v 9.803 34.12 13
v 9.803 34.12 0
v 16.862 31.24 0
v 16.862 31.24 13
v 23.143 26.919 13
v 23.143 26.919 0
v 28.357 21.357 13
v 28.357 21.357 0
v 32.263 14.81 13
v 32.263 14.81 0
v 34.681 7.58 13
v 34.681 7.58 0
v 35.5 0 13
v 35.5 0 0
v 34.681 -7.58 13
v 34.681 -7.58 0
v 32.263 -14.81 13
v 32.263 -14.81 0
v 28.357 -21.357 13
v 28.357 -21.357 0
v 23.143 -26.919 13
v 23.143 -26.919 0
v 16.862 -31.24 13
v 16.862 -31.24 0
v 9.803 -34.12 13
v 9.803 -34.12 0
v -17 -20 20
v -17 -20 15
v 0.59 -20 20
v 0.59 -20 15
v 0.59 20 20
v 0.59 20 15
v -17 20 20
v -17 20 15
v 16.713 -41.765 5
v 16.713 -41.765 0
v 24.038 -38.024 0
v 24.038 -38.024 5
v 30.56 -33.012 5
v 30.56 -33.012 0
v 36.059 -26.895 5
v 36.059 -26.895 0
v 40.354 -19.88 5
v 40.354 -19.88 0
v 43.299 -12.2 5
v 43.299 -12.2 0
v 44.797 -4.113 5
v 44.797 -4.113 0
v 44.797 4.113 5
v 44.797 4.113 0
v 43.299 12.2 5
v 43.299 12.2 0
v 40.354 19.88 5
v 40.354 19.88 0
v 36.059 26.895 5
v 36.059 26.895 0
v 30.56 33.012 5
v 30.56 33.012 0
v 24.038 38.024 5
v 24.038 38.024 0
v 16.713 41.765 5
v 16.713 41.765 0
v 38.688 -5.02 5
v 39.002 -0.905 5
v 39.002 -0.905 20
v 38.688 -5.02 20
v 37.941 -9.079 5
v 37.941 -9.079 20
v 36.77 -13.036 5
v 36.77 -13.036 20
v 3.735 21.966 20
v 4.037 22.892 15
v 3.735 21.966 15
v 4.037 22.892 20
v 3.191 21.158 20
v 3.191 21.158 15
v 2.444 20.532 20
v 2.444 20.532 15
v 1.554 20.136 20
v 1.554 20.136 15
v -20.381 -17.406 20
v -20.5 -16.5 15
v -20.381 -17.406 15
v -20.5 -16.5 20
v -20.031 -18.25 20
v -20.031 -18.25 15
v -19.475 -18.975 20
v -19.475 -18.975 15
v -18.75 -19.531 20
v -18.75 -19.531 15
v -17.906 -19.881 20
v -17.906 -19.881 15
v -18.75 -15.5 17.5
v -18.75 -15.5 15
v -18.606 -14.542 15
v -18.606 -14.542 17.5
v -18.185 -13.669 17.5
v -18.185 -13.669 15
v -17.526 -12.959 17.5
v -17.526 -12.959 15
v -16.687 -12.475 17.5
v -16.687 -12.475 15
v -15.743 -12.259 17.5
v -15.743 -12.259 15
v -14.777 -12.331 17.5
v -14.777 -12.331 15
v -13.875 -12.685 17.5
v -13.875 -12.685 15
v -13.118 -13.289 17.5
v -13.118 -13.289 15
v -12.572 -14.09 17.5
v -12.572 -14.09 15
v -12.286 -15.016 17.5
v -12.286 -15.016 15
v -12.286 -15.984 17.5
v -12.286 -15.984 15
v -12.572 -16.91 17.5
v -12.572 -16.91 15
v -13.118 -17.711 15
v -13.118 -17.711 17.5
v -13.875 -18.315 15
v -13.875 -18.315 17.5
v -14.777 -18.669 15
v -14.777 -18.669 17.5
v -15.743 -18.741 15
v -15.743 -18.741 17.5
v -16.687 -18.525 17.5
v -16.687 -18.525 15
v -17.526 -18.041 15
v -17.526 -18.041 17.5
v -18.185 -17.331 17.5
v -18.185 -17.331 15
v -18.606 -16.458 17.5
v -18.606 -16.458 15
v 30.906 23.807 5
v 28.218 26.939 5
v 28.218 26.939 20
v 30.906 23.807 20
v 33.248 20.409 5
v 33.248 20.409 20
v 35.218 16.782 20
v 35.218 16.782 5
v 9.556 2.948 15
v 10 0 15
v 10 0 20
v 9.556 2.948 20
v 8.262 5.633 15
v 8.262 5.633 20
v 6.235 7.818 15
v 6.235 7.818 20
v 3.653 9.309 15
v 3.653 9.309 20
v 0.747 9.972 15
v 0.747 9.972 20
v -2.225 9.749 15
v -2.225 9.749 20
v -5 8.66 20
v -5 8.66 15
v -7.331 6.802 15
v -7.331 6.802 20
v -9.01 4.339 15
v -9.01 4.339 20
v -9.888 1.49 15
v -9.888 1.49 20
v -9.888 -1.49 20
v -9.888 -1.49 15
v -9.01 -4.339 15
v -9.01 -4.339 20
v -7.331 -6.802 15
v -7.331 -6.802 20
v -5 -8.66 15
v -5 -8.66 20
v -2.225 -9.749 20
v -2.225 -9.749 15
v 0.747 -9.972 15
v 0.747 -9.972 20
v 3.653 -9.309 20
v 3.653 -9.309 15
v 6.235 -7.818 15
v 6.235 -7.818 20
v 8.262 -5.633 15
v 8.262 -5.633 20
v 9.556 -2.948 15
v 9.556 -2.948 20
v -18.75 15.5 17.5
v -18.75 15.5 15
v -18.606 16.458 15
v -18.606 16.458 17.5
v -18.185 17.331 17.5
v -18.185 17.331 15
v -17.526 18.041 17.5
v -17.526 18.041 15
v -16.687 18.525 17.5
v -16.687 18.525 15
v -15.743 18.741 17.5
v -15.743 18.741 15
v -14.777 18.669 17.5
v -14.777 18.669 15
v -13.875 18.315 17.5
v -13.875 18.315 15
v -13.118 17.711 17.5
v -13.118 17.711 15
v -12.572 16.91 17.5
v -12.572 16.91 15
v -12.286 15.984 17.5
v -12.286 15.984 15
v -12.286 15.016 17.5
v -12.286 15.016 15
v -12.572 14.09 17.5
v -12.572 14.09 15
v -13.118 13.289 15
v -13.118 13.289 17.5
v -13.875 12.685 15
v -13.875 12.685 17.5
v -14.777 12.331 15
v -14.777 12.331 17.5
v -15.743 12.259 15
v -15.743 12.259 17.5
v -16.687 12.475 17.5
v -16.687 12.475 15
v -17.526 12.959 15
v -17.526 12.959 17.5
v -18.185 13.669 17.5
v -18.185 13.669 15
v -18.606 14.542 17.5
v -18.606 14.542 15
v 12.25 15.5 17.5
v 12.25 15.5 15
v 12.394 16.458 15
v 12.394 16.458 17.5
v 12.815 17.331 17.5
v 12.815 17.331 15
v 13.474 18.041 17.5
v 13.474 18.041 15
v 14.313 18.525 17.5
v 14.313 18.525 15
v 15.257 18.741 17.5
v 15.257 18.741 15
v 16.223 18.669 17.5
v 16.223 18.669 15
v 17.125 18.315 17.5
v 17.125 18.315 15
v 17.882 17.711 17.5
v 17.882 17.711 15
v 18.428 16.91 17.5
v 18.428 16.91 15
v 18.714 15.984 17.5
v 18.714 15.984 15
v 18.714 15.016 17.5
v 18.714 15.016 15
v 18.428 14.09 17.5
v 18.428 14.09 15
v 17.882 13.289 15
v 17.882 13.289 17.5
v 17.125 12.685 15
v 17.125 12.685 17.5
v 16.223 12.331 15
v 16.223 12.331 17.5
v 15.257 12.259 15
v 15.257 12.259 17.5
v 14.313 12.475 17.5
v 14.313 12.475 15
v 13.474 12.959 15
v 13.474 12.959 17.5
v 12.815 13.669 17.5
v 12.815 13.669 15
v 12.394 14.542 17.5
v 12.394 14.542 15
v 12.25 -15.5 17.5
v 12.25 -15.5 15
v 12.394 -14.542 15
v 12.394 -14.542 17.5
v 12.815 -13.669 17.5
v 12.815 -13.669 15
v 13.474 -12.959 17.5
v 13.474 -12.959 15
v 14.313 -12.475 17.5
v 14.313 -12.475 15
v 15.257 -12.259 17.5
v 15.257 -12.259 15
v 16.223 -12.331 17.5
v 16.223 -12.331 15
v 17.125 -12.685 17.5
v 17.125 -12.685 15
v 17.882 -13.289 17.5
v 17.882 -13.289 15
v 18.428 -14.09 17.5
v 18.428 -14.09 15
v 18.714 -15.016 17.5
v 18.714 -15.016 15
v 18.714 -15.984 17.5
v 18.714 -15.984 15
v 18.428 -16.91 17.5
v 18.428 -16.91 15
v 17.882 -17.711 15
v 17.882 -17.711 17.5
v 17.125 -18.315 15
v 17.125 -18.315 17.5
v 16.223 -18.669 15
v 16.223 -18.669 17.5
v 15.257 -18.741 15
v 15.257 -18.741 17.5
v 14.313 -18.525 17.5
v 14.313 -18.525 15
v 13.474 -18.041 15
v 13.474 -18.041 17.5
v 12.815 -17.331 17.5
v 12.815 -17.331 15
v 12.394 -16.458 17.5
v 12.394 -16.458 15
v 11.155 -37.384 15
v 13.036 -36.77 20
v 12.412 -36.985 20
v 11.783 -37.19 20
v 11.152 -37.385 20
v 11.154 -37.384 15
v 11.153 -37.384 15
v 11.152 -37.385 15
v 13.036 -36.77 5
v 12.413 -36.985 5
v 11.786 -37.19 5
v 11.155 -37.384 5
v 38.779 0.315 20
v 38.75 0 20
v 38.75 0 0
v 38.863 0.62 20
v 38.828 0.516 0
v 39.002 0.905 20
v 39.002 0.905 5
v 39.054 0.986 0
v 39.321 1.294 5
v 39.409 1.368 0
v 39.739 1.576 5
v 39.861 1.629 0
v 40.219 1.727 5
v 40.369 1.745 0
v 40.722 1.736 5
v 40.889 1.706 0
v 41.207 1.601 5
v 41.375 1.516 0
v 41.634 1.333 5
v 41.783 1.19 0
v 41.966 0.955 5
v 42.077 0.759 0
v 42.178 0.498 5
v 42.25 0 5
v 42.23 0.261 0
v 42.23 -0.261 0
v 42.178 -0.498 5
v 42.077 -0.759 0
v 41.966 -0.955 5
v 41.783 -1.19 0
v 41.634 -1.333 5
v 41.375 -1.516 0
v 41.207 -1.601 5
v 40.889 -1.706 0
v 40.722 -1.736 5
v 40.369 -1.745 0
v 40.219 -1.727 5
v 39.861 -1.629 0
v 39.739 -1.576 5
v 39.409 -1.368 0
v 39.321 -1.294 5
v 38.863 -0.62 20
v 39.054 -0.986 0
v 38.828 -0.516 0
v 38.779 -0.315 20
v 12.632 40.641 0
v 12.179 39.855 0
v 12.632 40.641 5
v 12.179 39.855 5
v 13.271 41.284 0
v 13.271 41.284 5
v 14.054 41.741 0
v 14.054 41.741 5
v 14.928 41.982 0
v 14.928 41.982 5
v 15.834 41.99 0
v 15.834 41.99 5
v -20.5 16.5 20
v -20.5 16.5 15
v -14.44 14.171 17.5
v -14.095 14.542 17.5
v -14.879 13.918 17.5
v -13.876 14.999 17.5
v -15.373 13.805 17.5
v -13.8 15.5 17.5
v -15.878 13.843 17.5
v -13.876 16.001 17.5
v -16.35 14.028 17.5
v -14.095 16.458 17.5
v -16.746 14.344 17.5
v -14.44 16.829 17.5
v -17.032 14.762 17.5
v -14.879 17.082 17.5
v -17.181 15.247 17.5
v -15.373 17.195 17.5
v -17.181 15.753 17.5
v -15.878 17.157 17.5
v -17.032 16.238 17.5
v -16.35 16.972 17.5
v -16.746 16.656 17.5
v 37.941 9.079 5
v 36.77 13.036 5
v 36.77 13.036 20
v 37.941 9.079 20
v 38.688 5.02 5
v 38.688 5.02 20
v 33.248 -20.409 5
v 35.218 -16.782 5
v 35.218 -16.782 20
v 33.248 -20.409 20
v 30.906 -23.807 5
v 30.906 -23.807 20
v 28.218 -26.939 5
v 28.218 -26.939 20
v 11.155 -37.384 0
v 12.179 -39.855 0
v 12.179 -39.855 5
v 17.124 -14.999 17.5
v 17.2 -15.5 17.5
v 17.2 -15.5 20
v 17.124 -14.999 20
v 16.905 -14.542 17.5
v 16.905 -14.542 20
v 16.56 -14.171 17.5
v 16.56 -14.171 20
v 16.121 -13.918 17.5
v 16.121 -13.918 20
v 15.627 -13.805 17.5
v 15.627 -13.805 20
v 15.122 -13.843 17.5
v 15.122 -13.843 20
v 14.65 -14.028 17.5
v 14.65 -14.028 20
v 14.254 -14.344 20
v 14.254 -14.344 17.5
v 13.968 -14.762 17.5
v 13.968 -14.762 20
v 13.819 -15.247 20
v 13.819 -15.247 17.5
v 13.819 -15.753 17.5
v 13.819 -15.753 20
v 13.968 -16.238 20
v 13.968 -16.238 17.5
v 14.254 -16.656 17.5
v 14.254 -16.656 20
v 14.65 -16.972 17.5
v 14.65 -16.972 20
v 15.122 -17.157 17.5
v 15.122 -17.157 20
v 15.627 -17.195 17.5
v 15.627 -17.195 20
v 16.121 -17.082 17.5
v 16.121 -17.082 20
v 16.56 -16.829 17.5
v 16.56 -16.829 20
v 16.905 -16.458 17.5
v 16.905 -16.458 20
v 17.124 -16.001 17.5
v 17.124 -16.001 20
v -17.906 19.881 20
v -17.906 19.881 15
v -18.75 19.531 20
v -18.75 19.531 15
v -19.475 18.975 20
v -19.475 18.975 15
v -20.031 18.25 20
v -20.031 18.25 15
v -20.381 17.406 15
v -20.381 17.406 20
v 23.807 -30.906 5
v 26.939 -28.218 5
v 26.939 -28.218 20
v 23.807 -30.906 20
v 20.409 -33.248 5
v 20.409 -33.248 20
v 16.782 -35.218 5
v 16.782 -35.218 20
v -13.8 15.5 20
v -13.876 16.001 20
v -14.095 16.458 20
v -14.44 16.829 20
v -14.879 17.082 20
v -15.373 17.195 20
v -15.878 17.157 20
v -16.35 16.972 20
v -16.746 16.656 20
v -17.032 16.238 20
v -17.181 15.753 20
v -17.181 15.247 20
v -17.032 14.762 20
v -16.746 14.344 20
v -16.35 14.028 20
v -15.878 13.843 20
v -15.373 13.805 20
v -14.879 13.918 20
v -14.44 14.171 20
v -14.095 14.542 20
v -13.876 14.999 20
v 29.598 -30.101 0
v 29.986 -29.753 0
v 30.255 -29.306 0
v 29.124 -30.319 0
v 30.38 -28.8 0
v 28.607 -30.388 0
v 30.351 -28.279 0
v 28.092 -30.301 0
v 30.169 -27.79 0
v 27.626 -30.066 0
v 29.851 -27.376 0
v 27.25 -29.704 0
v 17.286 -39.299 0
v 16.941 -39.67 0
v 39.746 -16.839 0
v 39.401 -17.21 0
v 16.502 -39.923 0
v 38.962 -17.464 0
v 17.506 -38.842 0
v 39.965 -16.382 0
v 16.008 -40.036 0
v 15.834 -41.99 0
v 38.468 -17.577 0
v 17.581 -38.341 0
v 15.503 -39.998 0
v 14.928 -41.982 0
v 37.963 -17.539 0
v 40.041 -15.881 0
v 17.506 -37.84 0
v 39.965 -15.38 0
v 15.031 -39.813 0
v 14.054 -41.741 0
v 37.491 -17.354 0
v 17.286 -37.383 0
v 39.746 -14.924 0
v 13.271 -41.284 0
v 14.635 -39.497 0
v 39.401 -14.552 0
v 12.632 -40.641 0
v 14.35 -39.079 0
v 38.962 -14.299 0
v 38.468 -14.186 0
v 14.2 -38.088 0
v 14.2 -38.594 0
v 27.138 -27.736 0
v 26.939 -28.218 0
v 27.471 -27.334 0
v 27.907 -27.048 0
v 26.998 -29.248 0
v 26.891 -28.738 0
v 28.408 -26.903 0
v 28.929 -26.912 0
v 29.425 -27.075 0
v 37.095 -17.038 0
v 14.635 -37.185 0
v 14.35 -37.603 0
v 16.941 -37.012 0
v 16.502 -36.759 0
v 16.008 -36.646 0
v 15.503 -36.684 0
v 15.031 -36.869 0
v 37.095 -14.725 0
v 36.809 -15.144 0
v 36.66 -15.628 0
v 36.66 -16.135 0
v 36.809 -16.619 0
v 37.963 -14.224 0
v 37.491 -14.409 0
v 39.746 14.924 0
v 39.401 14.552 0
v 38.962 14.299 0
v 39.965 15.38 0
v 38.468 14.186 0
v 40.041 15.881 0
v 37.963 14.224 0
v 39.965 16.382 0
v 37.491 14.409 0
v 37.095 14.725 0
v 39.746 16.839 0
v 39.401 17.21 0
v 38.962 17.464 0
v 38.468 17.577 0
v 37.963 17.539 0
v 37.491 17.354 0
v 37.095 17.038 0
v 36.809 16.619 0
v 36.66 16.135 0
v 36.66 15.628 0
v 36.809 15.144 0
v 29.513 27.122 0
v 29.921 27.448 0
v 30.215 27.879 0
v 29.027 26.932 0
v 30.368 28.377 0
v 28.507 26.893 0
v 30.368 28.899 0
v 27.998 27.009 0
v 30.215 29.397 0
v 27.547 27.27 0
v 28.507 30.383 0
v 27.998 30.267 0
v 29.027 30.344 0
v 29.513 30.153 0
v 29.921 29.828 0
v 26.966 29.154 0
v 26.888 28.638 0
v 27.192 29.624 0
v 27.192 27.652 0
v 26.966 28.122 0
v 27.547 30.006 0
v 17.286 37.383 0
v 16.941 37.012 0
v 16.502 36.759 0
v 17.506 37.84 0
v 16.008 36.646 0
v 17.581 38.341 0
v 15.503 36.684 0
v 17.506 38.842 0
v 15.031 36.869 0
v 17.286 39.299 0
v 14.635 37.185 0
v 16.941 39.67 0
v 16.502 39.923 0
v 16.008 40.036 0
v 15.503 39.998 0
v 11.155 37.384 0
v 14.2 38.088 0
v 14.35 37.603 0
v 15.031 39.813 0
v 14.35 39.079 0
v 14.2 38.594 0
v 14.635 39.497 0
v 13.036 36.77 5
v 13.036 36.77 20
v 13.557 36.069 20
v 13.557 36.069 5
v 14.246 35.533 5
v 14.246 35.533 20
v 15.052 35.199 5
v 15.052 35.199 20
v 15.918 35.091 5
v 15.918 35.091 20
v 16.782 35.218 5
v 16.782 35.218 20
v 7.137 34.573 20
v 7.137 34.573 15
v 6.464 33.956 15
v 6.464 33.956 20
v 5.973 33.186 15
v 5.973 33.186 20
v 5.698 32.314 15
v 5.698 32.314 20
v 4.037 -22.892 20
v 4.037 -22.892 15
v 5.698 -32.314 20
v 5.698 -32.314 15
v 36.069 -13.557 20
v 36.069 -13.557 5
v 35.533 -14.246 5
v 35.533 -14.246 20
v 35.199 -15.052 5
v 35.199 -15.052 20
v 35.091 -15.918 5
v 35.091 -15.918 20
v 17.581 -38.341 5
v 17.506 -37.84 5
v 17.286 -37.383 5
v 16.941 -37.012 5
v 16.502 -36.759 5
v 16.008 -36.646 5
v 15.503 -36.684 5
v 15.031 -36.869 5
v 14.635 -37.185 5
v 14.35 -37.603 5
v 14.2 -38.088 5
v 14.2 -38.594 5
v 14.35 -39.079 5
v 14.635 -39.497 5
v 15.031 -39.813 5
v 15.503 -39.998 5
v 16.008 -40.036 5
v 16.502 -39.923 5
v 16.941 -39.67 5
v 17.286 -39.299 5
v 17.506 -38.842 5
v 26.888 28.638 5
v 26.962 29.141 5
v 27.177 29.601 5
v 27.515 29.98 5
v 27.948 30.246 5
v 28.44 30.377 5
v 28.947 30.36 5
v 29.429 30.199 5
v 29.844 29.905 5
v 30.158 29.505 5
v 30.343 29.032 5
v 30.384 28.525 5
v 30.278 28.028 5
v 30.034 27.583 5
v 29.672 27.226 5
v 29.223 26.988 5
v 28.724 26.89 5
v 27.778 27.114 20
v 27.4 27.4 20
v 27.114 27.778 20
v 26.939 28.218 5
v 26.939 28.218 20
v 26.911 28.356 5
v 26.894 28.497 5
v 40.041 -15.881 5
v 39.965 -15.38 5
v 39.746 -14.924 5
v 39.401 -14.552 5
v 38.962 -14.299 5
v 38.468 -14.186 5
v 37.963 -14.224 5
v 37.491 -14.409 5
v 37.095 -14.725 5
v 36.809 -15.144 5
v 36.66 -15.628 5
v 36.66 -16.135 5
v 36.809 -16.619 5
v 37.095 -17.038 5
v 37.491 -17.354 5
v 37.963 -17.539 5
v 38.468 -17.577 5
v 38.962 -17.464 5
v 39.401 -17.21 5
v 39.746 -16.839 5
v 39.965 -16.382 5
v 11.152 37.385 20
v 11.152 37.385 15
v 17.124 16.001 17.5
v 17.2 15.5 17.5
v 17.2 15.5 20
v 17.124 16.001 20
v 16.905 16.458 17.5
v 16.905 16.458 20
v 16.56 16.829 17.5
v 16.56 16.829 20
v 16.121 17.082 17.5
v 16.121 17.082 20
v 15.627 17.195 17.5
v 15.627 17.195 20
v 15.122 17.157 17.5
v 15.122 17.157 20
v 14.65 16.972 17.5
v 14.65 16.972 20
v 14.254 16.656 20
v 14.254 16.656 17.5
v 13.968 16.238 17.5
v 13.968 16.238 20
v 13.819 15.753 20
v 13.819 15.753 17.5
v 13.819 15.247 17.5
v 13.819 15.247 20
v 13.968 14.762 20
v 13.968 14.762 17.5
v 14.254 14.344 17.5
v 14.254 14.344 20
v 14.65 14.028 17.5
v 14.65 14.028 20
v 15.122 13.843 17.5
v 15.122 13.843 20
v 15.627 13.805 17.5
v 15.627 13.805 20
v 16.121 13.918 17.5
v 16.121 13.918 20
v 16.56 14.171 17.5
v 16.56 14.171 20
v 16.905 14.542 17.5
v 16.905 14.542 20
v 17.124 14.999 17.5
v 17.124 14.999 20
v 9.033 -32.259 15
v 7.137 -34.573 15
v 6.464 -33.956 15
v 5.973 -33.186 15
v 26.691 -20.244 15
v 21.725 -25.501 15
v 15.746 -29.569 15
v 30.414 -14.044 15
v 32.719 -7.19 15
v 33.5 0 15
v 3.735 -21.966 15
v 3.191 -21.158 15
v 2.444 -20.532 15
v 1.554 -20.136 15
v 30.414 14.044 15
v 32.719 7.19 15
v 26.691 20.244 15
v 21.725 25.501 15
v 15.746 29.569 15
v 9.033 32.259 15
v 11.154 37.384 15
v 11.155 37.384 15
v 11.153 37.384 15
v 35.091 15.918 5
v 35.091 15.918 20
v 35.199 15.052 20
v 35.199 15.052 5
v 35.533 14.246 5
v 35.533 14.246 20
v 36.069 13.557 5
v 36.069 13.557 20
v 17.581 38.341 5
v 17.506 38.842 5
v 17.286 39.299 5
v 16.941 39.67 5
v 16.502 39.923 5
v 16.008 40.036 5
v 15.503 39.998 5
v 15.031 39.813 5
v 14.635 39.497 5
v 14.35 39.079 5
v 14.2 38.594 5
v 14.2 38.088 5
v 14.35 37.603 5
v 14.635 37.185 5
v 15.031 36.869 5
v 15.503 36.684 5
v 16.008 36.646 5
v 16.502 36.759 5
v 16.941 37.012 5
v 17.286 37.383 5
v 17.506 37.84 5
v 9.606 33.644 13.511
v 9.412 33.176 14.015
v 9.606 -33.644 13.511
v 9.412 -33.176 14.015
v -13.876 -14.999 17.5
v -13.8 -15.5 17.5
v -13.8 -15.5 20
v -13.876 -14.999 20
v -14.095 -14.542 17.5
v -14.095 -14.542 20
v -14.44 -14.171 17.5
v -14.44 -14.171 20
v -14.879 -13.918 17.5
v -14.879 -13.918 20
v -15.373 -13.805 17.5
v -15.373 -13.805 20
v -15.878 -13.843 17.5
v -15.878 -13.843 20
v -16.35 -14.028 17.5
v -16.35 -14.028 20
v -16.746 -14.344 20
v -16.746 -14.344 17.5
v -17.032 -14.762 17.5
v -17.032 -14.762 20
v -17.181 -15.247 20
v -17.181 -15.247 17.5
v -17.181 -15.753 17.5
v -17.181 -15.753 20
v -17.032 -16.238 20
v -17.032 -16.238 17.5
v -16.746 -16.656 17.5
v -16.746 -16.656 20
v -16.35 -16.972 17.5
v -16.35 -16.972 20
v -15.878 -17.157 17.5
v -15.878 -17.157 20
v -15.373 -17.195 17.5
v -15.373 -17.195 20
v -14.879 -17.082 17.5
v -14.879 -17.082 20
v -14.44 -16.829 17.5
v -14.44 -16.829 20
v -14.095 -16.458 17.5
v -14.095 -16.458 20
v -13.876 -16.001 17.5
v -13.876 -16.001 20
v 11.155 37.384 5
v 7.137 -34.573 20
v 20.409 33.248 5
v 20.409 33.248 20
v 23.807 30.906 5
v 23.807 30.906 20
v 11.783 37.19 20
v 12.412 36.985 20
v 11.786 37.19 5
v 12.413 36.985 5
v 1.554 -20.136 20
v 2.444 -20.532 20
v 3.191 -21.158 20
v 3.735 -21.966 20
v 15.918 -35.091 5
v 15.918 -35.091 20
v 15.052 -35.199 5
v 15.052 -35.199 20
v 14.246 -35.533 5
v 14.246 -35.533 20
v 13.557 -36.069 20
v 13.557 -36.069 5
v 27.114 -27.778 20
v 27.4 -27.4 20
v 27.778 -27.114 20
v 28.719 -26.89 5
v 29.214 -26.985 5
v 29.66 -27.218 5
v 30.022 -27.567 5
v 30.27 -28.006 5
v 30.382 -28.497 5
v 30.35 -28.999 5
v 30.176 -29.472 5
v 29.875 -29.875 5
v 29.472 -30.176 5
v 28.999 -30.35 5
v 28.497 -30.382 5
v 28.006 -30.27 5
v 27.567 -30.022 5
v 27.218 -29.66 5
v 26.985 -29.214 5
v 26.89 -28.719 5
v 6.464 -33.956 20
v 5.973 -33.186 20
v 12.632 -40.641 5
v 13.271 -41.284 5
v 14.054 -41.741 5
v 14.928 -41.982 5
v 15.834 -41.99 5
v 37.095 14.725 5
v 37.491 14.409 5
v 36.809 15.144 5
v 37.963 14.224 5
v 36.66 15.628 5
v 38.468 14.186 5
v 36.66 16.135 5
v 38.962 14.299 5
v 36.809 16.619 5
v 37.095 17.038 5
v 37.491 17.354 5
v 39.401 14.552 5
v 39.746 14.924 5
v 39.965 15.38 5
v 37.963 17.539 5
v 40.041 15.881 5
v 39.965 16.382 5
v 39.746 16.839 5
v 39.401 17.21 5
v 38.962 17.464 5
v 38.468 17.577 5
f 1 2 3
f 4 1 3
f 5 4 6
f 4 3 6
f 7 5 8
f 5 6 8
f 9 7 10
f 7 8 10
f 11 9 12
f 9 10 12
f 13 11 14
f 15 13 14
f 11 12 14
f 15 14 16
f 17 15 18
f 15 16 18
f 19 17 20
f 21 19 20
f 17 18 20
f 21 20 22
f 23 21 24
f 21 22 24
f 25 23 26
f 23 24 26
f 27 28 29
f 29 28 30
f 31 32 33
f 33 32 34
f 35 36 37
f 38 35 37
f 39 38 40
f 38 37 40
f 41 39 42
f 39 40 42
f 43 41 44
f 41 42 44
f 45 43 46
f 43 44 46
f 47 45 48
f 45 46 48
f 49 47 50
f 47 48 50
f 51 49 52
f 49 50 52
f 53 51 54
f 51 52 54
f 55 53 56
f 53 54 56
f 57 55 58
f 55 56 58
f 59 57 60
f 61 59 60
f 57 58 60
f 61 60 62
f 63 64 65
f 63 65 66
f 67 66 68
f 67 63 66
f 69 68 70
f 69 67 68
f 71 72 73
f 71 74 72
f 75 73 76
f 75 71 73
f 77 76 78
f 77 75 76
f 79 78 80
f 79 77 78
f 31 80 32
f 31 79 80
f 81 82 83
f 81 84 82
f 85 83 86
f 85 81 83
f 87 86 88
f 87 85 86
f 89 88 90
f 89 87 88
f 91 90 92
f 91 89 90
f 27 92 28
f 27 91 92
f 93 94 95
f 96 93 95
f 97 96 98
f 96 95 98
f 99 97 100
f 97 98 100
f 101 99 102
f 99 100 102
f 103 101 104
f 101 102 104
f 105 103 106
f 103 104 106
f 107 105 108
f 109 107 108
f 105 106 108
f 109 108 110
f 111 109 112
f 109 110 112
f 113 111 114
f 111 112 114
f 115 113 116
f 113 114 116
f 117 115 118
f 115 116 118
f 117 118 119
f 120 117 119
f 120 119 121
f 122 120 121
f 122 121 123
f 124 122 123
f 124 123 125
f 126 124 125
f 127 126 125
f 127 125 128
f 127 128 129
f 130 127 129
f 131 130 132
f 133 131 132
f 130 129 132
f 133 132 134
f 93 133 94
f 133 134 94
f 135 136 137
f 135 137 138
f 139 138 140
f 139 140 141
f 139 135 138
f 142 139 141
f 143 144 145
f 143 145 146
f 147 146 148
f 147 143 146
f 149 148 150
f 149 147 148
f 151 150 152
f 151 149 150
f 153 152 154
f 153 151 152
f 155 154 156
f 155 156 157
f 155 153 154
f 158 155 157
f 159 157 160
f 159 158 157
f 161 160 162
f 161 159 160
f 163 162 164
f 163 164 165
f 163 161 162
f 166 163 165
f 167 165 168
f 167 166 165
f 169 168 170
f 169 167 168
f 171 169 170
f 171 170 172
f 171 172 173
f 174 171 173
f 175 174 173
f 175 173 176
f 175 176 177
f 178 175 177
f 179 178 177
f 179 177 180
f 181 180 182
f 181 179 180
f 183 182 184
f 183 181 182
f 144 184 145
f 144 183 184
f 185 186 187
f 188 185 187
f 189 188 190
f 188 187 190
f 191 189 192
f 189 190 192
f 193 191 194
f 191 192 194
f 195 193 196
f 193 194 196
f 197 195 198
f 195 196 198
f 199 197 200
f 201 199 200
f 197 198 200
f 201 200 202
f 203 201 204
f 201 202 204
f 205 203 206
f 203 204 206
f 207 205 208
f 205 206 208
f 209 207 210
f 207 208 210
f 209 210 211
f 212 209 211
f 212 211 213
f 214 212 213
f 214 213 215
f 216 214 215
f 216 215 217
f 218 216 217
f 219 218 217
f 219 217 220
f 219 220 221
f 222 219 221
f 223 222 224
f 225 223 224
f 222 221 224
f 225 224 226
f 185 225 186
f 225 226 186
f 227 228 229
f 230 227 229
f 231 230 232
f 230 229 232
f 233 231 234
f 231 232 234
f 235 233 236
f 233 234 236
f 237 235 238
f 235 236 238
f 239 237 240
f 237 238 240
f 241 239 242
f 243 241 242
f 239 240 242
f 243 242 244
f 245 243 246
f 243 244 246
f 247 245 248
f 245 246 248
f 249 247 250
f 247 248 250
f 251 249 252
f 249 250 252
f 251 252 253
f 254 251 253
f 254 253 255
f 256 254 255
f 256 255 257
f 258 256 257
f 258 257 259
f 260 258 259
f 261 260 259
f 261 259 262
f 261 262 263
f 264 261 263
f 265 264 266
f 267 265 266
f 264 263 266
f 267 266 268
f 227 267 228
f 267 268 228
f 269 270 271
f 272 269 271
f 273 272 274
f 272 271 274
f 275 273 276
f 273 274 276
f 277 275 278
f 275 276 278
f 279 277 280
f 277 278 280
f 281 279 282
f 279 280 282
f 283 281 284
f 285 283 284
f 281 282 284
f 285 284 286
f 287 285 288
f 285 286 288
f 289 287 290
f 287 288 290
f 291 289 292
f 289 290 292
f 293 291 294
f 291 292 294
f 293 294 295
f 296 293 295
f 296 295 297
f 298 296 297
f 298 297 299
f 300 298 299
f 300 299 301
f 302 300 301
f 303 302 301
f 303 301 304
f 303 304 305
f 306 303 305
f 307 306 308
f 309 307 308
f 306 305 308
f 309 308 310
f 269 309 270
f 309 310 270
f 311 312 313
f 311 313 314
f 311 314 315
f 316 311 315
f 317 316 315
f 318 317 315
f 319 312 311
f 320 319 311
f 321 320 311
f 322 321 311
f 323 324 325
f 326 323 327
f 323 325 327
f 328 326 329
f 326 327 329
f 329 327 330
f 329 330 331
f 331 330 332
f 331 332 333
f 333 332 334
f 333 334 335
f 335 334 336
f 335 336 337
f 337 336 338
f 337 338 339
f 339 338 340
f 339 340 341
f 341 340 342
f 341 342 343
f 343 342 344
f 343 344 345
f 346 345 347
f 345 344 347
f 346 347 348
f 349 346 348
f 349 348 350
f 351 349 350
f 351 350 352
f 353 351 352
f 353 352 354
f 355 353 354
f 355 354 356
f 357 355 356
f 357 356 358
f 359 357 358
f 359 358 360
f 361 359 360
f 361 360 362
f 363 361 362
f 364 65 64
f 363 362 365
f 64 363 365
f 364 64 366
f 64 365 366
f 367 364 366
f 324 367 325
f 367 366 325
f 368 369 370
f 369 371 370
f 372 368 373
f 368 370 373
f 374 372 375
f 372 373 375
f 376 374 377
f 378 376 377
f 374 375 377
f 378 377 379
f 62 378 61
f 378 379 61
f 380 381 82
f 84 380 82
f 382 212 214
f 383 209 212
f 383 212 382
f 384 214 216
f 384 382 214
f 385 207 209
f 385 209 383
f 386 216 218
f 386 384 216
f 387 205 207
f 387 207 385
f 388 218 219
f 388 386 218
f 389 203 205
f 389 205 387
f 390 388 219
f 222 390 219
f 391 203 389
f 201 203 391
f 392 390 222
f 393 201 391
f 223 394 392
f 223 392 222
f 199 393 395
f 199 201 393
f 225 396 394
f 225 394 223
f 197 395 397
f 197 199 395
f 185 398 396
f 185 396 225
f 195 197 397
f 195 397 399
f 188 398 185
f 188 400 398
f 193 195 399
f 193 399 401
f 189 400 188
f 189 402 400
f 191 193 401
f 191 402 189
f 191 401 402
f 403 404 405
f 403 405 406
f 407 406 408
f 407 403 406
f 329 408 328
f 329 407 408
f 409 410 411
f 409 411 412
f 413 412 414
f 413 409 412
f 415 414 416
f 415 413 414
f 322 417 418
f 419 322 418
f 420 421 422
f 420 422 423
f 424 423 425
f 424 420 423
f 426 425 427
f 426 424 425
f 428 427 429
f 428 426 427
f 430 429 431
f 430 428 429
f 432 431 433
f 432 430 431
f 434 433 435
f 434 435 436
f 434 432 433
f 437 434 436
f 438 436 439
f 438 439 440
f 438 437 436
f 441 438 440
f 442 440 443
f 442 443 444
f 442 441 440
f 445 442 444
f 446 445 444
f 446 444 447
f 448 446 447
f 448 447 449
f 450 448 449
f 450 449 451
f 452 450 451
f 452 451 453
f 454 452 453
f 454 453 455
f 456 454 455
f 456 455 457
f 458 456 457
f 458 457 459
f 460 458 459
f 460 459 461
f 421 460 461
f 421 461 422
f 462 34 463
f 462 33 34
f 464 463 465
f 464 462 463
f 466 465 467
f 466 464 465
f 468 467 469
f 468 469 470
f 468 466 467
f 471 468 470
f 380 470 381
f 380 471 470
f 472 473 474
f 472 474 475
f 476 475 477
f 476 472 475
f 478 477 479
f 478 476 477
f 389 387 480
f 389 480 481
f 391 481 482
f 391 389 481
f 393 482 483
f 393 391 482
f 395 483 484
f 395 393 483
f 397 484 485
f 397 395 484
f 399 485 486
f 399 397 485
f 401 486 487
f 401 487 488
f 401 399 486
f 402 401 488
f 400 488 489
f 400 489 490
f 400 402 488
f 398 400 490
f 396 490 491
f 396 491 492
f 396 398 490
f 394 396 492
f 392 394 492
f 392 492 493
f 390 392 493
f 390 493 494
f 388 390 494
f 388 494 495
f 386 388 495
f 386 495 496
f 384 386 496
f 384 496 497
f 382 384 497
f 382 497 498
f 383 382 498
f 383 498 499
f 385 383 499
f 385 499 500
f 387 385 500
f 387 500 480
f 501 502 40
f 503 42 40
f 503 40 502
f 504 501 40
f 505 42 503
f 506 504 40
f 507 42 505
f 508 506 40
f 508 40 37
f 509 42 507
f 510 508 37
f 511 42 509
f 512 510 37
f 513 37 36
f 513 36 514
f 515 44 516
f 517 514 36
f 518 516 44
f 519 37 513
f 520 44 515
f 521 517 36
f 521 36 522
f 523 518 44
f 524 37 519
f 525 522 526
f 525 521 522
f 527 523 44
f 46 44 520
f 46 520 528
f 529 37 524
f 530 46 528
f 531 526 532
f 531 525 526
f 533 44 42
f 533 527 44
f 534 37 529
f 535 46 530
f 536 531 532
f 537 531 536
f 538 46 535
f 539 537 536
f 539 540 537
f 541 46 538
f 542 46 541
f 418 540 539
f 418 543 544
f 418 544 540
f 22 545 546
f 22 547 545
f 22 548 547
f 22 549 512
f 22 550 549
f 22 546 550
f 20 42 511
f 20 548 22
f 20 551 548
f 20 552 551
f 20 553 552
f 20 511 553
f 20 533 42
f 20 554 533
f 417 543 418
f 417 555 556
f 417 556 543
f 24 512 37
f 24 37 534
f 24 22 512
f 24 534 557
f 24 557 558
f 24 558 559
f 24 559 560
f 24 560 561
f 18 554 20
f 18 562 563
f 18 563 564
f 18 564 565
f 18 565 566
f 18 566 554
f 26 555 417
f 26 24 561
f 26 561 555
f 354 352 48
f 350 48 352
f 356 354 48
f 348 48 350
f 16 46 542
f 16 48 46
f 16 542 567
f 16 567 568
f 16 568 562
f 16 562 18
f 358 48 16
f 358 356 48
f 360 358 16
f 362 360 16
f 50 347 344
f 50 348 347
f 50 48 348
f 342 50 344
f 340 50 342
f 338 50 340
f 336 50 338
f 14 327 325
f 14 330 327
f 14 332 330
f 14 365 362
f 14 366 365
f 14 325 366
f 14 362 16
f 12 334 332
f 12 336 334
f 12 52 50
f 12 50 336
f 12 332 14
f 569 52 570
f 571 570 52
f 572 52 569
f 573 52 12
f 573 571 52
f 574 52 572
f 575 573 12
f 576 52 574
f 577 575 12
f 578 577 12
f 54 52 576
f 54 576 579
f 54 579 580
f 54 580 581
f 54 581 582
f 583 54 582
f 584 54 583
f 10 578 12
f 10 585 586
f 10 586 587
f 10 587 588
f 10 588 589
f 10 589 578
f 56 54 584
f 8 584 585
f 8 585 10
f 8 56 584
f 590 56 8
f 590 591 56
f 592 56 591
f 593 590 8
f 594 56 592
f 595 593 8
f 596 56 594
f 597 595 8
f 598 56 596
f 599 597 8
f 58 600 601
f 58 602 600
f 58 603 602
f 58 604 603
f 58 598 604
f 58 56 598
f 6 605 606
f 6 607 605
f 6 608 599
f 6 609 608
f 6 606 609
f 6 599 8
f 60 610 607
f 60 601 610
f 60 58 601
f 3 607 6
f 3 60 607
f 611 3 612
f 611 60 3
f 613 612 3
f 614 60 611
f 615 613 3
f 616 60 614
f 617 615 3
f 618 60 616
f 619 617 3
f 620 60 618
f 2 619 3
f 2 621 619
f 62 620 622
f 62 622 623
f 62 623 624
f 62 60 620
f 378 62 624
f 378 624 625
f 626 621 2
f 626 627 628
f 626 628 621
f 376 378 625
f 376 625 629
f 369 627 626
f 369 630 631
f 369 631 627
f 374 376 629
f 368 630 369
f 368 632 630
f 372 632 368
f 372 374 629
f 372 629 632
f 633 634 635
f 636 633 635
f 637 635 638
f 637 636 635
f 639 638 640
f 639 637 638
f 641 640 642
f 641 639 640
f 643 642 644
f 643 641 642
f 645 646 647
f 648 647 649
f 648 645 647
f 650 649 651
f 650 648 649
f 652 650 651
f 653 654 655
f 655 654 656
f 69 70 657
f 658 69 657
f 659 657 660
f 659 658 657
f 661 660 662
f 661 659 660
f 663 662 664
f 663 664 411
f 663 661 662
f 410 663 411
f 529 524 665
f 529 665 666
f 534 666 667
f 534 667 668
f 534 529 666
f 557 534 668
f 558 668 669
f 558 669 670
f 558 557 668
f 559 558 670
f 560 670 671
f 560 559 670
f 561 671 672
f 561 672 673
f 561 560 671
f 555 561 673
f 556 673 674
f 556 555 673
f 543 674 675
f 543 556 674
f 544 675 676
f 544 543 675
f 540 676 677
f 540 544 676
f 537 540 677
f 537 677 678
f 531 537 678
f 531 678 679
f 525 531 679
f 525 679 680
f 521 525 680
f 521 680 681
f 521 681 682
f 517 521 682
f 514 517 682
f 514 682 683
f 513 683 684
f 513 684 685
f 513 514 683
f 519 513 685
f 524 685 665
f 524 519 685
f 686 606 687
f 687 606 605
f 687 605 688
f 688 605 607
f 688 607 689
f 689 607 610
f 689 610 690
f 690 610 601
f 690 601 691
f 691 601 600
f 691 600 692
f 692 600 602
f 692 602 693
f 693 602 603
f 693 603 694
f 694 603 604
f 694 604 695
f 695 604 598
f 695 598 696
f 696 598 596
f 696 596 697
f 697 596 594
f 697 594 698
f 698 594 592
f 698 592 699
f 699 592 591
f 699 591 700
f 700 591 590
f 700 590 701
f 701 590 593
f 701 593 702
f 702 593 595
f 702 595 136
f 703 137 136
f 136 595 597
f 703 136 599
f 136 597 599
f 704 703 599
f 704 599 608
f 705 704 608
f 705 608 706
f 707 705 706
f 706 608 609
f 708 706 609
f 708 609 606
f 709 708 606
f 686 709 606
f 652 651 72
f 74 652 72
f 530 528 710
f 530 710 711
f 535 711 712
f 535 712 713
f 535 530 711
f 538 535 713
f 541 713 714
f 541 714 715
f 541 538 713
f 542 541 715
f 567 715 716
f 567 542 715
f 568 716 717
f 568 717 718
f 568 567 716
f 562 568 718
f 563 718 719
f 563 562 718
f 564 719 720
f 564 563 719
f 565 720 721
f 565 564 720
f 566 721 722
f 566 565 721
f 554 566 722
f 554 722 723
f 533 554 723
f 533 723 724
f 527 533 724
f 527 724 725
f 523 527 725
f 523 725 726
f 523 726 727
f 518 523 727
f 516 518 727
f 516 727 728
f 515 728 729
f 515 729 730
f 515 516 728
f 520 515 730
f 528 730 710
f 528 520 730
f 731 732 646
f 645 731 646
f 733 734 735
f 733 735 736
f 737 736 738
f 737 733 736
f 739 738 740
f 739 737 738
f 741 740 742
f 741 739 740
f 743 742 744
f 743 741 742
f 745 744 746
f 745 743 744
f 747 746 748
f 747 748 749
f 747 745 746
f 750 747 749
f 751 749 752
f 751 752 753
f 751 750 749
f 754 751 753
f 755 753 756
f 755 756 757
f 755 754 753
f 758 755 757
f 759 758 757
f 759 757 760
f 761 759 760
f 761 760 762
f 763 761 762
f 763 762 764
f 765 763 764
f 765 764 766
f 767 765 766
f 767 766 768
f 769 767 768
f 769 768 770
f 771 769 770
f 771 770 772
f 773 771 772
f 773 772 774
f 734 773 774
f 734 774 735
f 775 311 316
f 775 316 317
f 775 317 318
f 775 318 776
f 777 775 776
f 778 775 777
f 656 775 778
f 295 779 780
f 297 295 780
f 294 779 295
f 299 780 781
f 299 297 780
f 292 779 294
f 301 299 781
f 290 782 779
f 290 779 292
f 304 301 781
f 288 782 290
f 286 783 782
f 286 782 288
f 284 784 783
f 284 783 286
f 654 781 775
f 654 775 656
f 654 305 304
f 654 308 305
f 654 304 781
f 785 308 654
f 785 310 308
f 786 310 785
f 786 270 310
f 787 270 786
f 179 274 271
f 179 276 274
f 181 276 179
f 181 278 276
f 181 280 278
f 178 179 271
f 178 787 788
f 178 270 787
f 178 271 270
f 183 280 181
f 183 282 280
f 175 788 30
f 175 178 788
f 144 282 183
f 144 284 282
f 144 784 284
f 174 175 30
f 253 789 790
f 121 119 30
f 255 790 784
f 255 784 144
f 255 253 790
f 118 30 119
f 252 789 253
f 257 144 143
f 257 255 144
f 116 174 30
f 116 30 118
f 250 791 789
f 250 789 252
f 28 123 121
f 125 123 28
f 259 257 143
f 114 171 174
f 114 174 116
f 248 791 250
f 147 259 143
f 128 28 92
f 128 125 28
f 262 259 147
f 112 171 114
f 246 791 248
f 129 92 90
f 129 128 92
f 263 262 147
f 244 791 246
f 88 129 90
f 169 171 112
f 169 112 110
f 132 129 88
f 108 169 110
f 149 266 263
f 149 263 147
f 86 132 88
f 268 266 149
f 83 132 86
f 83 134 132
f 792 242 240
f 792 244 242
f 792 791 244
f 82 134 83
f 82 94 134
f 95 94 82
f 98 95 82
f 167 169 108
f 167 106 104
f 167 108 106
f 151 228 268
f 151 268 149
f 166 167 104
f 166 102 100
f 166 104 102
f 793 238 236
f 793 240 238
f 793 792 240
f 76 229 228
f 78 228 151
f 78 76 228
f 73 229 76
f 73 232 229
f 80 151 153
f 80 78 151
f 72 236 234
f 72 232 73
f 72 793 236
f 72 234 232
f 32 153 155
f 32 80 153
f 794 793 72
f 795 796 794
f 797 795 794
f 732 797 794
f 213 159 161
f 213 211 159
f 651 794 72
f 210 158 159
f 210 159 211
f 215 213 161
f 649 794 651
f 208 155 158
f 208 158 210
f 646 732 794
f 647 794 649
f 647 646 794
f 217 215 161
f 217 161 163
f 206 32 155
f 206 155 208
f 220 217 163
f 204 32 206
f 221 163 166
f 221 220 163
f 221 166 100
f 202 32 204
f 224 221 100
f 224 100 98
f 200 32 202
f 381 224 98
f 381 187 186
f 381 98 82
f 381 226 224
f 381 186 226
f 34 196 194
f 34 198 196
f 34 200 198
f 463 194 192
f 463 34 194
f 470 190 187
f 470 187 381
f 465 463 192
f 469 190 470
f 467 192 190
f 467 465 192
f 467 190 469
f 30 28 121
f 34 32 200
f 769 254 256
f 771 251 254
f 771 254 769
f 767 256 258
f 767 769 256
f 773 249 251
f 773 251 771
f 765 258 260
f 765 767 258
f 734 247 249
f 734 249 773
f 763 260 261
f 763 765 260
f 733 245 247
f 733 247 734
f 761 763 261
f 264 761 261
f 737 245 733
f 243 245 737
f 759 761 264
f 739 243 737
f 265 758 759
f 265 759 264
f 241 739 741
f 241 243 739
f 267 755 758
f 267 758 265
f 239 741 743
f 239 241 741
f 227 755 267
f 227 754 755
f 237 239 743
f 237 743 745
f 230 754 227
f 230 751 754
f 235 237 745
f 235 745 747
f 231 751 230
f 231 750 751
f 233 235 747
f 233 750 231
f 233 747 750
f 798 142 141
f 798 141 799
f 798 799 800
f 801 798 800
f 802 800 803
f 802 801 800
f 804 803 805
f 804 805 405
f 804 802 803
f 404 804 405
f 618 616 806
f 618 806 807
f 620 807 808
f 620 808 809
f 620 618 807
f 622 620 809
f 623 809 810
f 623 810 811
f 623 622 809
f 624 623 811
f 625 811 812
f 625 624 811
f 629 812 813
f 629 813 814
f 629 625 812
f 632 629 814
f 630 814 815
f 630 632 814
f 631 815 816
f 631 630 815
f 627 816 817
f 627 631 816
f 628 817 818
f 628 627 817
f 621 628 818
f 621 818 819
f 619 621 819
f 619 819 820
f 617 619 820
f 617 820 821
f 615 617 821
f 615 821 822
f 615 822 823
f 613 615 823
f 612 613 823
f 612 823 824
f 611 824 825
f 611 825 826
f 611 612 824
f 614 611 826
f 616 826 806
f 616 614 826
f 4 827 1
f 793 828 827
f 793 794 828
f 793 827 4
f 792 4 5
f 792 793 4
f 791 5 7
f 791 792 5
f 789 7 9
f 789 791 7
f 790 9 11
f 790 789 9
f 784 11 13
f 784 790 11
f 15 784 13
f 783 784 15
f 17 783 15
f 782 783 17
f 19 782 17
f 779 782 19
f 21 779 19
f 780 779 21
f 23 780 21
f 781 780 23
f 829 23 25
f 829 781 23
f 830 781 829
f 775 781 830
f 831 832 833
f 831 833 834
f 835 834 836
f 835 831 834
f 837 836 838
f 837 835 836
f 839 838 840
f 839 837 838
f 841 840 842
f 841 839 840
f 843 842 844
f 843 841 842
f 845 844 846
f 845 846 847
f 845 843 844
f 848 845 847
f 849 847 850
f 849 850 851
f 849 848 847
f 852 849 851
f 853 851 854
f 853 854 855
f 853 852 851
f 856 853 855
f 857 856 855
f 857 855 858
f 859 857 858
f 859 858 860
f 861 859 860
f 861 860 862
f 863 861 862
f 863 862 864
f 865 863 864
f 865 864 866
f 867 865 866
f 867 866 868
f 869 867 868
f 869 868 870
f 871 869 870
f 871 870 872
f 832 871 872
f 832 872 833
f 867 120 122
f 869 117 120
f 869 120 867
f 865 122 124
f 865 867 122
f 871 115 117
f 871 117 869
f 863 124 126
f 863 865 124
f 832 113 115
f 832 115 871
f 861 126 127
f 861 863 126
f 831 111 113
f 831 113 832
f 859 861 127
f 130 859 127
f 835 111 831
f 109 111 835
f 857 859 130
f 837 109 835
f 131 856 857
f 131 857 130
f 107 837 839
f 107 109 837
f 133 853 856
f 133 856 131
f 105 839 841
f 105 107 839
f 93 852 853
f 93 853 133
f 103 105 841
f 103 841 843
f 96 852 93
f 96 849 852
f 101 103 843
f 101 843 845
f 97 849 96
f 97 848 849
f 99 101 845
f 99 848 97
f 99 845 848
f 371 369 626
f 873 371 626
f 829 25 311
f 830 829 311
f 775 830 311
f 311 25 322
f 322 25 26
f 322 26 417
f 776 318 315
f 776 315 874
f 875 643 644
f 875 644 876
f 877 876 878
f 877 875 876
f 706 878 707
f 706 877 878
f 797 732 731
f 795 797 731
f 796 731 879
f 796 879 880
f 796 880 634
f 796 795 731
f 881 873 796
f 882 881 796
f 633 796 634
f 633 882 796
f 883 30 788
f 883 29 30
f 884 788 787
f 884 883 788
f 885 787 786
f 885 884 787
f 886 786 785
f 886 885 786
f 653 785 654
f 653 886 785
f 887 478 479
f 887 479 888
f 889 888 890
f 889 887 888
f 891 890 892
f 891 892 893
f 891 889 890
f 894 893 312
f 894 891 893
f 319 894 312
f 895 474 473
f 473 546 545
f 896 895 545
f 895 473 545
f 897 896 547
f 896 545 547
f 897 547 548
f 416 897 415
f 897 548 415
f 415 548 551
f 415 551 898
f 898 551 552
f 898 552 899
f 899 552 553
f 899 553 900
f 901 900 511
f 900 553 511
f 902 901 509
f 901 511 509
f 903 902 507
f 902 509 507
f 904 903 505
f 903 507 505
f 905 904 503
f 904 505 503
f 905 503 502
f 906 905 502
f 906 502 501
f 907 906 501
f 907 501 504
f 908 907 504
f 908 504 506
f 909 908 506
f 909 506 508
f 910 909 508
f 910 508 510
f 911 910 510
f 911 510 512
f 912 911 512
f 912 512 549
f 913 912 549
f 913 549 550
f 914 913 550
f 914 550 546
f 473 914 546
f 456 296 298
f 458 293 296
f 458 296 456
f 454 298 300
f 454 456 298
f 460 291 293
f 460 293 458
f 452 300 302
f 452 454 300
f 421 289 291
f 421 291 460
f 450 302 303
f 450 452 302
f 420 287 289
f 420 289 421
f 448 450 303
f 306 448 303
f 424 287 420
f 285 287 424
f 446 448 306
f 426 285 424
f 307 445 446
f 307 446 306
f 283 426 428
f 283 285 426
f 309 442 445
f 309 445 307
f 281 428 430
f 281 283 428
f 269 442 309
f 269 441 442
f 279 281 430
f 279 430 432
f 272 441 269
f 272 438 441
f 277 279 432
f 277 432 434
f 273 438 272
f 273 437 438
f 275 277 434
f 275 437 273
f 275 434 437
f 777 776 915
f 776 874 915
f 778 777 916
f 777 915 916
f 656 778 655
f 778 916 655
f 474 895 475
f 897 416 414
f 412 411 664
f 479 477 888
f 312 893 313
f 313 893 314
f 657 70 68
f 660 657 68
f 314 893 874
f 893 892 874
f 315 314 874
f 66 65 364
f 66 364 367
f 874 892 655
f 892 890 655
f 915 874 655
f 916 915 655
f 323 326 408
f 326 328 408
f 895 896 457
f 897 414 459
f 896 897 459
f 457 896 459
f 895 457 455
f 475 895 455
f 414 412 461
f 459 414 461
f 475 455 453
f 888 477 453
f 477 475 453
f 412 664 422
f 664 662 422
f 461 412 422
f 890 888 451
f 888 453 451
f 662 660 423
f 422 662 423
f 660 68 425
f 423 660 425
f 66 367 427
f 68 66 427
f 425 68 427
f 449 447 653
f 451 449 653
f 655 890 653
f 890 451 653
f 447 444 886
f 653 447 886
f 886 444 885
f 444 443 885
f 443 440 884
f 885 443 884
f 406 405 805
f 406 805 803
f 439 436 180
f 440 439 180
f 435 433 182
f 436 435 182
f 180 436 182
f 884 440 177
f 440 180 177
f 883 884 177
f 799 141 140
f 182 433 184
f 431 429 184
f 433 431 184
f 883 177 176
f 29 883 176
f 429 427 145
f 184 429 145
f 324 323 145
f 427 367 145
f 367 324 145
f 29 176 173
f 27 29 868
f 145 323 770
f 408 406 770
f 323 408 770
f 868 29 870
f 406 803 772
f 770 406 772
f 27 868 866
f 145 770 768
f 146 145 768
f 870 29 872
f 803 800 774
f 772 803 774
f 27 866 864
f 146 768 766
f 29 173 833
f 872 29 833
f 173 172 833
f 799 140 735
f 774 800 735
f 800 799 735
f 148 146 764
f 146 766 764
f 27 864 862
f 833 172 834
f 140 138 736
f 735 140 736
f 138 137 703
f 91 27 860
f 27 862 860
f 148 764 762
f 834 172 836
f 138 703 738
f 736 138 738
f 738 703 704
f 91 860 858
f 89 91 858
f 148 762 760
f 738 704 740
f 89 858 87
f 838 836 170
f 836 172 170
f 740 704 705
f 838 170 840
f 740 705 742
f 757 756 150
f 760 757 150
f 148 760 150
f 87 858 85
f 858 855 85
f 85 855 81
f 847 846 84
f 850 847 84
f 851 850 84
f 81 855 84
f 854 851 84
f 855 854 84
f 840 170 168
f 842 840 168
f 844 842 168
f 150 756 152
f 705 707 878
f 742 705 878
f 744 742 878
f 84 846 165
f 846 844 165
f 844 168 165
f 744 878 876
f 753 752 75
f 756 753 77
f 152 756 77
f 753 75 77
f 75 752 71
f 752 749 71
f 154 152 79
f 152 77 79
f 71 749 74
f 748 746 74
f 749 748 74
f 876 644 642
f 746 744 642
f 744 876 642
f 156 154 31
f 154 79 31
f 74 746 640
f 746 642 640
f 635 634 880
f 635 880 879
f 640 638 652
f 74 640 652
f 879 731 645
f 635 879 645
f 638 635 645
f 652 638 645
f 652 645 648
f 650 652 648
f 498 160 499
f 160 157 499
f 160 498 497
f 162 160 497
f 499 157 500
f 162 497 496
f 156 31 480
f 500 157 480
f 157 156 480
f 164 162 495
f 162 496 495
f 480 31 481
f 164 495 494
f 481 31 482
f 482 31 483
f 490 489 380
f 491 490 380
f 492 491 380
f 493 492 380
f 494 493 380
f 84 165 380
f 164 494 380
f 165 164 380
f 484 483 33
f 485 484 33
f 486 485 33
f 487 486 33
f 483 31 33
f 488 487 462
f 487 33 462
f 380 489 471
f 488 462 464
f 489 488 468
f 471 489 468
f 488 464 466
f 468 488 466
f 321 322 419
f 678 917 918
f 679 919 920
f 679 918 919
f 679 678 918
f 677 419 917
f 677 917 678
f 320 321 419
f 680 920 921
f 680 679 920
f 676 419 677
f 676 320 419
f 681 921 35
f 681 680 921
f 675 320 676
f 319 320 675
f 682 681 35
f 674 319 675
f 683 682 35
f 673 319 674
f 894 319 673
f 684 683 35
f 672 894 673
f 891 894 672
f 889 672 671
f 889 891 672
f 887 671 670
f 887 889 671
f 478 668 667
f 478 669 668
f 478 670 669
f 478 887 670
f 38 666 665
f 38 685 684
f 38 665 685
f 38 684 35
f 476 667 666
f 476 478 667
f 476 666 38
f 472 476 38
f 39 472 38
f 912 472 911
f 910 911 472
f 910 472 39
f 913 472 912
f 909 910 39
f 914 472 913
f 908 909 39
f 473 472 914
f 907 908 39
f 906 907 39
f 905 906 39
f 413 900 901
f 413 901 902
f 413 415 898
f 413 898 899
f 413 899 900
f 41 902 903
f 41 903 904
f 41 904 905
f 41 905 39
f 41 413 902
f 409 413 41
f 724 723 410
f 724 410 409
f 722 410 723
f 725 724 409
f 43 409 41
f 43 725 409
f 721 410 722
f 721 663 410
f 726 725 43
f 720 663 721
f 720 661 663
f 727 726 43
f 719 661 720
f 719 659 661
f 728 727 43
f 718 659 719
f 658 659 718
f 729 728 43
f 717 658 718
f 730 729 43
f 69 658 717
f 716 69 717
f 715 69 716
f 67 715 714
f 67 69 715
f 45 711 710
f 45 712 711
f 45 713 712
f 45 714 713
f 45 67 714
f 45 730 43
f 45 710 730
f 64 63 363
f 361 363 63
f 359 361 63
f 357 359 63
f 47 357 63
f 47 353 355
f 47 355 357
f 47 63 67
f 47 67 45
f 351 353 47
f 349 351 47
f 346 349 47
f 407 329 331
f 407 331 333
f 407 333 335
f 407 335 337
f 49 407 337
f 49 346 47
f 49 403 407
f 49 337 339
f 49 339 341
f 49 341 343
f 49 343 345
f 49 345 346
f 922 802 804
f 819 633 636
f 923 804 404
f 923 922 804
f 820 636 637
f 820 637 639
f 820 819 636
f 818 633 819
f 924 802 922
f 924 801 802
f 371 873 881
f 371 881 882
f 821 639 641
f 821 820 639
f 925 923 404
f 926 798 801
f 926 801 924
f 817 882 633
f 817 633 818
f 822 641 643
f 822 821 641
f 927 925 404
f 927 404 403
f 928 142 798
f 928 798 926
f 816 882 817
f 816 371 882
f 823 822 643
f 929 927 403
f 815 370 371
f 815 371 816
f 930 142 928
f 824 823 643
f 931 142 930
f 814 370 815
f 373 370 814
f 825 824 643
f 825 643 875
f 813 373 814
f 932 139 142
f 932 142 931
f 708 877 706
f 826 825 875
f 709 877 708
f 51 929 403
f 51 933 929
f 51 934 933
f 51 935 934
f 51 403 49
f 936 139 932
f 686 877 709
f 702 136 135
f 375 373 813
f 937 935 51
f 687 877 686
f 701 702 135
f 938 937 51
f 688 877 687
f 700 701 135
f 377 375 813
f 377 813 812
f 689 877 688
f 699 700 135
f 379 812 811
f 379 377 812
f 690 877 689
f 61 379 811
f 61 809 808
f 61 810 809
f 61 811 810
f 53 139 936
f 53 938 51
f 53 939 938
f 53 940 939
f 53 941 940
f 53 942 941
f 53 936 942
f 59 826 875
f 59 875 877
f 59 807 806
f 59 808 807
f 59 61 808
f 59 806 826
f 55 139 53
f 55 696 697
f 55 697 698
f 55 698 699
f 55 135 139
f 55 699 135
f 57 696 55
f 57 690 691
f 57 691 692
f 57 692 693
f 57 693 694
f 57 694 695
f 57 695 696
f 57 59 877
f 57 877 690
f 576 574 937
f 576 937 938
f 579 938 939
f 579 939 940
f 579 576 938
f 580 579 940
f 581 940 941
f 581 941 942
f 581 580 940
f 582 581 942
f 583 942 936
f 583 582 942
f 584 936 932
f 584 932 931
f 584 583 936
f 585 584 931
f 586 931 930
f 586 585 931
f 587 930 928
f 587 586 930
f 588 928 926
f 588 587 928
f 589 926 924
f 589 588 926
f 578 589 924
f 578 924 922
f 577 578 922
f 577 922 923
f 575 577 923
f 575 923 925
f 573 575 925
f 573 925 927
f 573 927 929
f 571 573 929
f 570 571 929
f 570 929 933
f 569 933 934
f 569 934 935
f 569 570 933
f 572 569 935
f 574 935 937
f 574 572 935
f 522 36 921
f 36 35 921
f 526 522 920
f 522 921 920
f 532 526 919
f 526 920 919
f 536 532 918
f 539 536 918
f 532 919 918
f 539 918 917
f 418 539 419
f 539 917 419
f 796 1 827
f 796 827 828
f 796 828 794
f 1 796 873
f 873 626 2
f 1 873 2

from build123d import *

# Parameters (mm, degrees)
CROQUIS1_R              = 1.7
SALIENTE_EXTRUIR1_DEPTH = 5
CROQUIS2_R              = 39.012383989
SALIENTE_EXTRUIR2_DEPTH = 20
CORTAR_EXTRUIR1_START   = -5
CROQUIS3_R              = 1.7
CROQUIS3_R_2            = 10
CORTAR_EXTRUIR1_DEPTH   = 5
CORTAR_EXTRUIR2_DEPTH   = 15
CHAFL_N1_SIZE           = 4.75
REDONDEO2_R             = 3.5
CROQUIS5_R              = 3.25
CORTAR_EXTRUIR3_DEPTH   = 15
MATRIZC1_COUNT          = 4
MATRIZC1_ANGLE          = 135
CROQUIS6_R              = 3.25
CORTAR_EXTRUIR4_DEPTH   = 2.5
CHAFL_N4_SIZE           = 2
CROQUIS8_R              = 1.75
CORTAR_EXTRUIR5_DEPTH   = 32.5


with BuildPart() as part:
    # Croquis1 → Saliente-Extruir1 (new body)
    with BuildSketch(Plane.XY):
        with BuildLine():
            Line((13.451293891, 42.926799862), (10.772509864, 36.459643134))
            ThreePointArc((10.772509864, 36.459643134), (38.017792496, 0), (10.772509864, -36.459643134))
            Line((10.772509864, -36.459643134), (13.451293891, -42.926799862))
            ThreePointArc((13.451293891, -42.926799862), (44.984969198, 0), (13.451293891, 42.926799862))
        make_face()
        with Locations((15.881362443, 38.341000599)):
            Circle(CROQUIS1_R, mode=Mode.SUBTRACT)
        with Locations((38.341000599, 15.881362443)):
            Circle(CROQUIS1_R, mode=Mode.SUBTRACT)
        with Locations((38.341000599, -15.881362443)):
            Circle(CROQUIS1_R, mode=Mode.SUBTRACT)
        with Locations((15.881362443, -38.341000599)):
            Circle(CROQUIS1_R, mode=Mode.SUBTRACT)
    extrude(amount=SALIENTE_EXTRUIR1_DEPTH)

    # Croquis2 → Saliente-Extruir2 (add)
    with BuildSketch(Plane(origin=(0, 0, 0), x_dir=(-1, 0, 0), z_dir=(0, 0, -1))):
        Circle(CROQUIS2_R)
    extrude(amount=-SALIENTE_EXTRUIR2_DEPTH)

    # Croquis3 → Cortar-Extruir1 (cut)
    with BuildSketch(Plane.XY.offset(20).offset(CORTAR_EXTRUIR1_START)):
        with Locations((-15.5, 15.5)):
            Circle(CROQUIS3_R)
        with Locations((15.5, 15.5)):
            Circle(CROQUIS3_R)
        with Locations((15.5, -15.5)):
            Circle(CROQUIS3_R)
        with Locations((-15.5, -15.5)):
            Circle(CROQUIS3_R)
        Circle(CROQUIS3_R_2)
        with BuildLine():
            Line((-20.5, 20), (-20.5, -20))
            Line((-20.5, -20), (3.526539614, -20))
            Line((3.526539614, -20), (6.774429386, -38.419698215))
            ThreePointArc((6.774429386, -38.419698215), (-39.012383989, 0), (6.774429386, 38.419698215))
            Line((6.774429386, 38.419698215), (3.526539614, 20))
            Line((3.526539614, 20), (-20.5, 20))
        make_face()
    extrude(amount=CORTAR_EXTRUIR1_DEPTH, mode=Mode.SUBTRACT)

    # Croquis4 → Cortar-Extruir2 (cut)
    with BuildSketch(Plane(origin=(0, 0, 0), x_dir=(-1, 0, 0), z_dir=(0, 0, -1))):
        with BuildLine():
            Line((-13.451293891, 42.926799862), (-11.155193297, 37.383522667))
            Line((-11.155193297, 37.383522667), (-9.803229729, 34.119593885))
            ThreePointArc((-9.803229729, 34.119593885), (-35.5, 0), (-9.803229729, -34.119593885))
            Line((-9.803229729, -34.119593885), (-11.155193297, -37.383522667))
            Line((-11.155193297, -37.383522667), (-13.451293891, -42.926799862))
            ThreePointArc((-13.451293891, -42.926799862), (44.984969198, 0), (-13.451293891, 42.926799862))
        make_face()
    extrude(amount=-CORTAR_EXTRUIR2_DEPTH, mode=Mode.SUBTRACT)

    # Chaflán1
    # the kernel refuses this chamfer: 4.75 mm, written as the material it takes off along each edge
    with BuildSketch(Plane(origin=(6.774429386, -38.419698215, 2.784505807), x_dir=(0.973158962162818, 0.2301339487389611, 0), z_dir=(0, 0, 1))) as chafl_n1_piece_1:
        with BuildLine():
            Line((4.498160378, 0), (CHAFL_N1_SIZE * 0.0576504165896, CHAFL_N1_SIZE * 0.998336831669))
            Line((CHAFL_N1_SIZE * 0.0576504165896, CHAFL_N1_SIZE * 0.998336831669), (0, 0))
            ThreePointArc((0, 0), (2.312261051, -0.064833001), (4.498160378, 0))
        make_face()
    extrude(amount=29.430988386, mode=Mode.SUBTRACT)
    with BuildSketch(Plane(origin=(6.774429386, 38.419698215, 2.784505807), x_dir=(0.9731589621628183, -0.23013394873896015, 0), z_dir=(0, 0, 1))) as chafl_n1_piece_2:
        with BuildLine():
            Line((4.498160378, 0), (CHAFL_N1_SIZE * 0.0576504165896, -CHAFL_N1_SIZE * 0.998336831669))
            Line((CHAFL_N1_SIZE * 0.0576504165896, -CHAFL_N1_SIZE * 0.998336831669), (0, 0))
            ThreePointArc((0, 0), (2.312261051, 0.064833001), (4.498160378, 0))
        make_face()
    extrude(amount=29.430988386, mode=Mode.SUBTRACT)

    # Redondeo2
    redondeo2_edges = [part.edges().sort_by_distance(p)[0] for p in [
        (5.949600542, 33.741861389, 17.5),
        (5.949600542, -33.741861389, 17.5),
        (3.526539614, 20, 17.5),
        (-20.5, 20, 17.5),
        (-20.5, -20, 17.5),
        (3.526539614, -20, 17.5),
        (13.451293891, -42.926799862, 2.5),
        (13.451293891, 42.926799862, 2.5),
    ]]
    fillet(redondeo2_edges, radius=REDONDEO2_R)

    # Croquis5 → Cortar-Extruir3 (cut)
    with BuildSketch(Plane.XY.offset(5)):
        with Locations((15.881362443, -38.341000599)):
            Circle(CROQUIS5_R)
    cortar_extruir3 = extrude(amount=CORTAR_EXTRUIR3_DEPTH, mode=Mode.SUBTRACT)

    # MatrizC1: Cortar-Extruir3 ×4 about axis
    matrizc1_axis = Axis((0, 0, 0), (0, 0, 1))
    for i in range(1, MATRIZC1_COUNT):
        add(cortar_extruir3.rotate(matrizc1_axis, i * MATRIZC1_ANGLE / (MATRIZC1_COUNT - 1)), mode=Mode.SUBTRACT)

    # Croquis6 → Cortar-Extruir4 (cut)
    with BuildSketch(Plane(origin=(0, 0, 15), x_dir=(-1, 0, 0), z_dir=(0, 0, -1))):
        with Locations((15.5, 15.5)):
            Circle(CROQUIS6_R)
        with Locations((15.5, -15.5)):
            Circle(CROQUIS6_R)
        with Locations((-15.5, -15.5)):
            Circle(CROQUIS6_R)
        with Locations((-15.5, 15.5)):
            Circle(CROQUIS6_R)
    extrude(amount=-CORTAR_EXTRUIR4_DEPTH, mode=Mode.SUBTRACT)

    # Chaflán4
    chafl_n4_edges = [part.edges().sort_by_distance(p)[0] for p in [
        (35.5, 0, 15),
    ]]
    chamfer(chafl_n4_edges, length=CHAFL_N4_SIZE)

    # Croquis8 → Cortar-Extruir5 (cut)
    with BuildSketch(Plane(origin=(0, 0, 0), x_dir=(-1, 0, 0), z_dir=(0, 0, -1))):
        with Locations((-40.5, 0)):
            Circle(CROQUIS8_R)
        with Locations(Location((-28.637824638, -28.637824638, 0), (0, 0, 13.876951429))):
            Circle(CROQUIS8_R)
        with Locations((-28.637824638, 28.637824638)):
            Circle(CROQUIS8_R)
    extrude(amount=-CORTAR_EXTRUIR5_DEPTH, mode=Mode.SUBTRACT)


solid = part.part
